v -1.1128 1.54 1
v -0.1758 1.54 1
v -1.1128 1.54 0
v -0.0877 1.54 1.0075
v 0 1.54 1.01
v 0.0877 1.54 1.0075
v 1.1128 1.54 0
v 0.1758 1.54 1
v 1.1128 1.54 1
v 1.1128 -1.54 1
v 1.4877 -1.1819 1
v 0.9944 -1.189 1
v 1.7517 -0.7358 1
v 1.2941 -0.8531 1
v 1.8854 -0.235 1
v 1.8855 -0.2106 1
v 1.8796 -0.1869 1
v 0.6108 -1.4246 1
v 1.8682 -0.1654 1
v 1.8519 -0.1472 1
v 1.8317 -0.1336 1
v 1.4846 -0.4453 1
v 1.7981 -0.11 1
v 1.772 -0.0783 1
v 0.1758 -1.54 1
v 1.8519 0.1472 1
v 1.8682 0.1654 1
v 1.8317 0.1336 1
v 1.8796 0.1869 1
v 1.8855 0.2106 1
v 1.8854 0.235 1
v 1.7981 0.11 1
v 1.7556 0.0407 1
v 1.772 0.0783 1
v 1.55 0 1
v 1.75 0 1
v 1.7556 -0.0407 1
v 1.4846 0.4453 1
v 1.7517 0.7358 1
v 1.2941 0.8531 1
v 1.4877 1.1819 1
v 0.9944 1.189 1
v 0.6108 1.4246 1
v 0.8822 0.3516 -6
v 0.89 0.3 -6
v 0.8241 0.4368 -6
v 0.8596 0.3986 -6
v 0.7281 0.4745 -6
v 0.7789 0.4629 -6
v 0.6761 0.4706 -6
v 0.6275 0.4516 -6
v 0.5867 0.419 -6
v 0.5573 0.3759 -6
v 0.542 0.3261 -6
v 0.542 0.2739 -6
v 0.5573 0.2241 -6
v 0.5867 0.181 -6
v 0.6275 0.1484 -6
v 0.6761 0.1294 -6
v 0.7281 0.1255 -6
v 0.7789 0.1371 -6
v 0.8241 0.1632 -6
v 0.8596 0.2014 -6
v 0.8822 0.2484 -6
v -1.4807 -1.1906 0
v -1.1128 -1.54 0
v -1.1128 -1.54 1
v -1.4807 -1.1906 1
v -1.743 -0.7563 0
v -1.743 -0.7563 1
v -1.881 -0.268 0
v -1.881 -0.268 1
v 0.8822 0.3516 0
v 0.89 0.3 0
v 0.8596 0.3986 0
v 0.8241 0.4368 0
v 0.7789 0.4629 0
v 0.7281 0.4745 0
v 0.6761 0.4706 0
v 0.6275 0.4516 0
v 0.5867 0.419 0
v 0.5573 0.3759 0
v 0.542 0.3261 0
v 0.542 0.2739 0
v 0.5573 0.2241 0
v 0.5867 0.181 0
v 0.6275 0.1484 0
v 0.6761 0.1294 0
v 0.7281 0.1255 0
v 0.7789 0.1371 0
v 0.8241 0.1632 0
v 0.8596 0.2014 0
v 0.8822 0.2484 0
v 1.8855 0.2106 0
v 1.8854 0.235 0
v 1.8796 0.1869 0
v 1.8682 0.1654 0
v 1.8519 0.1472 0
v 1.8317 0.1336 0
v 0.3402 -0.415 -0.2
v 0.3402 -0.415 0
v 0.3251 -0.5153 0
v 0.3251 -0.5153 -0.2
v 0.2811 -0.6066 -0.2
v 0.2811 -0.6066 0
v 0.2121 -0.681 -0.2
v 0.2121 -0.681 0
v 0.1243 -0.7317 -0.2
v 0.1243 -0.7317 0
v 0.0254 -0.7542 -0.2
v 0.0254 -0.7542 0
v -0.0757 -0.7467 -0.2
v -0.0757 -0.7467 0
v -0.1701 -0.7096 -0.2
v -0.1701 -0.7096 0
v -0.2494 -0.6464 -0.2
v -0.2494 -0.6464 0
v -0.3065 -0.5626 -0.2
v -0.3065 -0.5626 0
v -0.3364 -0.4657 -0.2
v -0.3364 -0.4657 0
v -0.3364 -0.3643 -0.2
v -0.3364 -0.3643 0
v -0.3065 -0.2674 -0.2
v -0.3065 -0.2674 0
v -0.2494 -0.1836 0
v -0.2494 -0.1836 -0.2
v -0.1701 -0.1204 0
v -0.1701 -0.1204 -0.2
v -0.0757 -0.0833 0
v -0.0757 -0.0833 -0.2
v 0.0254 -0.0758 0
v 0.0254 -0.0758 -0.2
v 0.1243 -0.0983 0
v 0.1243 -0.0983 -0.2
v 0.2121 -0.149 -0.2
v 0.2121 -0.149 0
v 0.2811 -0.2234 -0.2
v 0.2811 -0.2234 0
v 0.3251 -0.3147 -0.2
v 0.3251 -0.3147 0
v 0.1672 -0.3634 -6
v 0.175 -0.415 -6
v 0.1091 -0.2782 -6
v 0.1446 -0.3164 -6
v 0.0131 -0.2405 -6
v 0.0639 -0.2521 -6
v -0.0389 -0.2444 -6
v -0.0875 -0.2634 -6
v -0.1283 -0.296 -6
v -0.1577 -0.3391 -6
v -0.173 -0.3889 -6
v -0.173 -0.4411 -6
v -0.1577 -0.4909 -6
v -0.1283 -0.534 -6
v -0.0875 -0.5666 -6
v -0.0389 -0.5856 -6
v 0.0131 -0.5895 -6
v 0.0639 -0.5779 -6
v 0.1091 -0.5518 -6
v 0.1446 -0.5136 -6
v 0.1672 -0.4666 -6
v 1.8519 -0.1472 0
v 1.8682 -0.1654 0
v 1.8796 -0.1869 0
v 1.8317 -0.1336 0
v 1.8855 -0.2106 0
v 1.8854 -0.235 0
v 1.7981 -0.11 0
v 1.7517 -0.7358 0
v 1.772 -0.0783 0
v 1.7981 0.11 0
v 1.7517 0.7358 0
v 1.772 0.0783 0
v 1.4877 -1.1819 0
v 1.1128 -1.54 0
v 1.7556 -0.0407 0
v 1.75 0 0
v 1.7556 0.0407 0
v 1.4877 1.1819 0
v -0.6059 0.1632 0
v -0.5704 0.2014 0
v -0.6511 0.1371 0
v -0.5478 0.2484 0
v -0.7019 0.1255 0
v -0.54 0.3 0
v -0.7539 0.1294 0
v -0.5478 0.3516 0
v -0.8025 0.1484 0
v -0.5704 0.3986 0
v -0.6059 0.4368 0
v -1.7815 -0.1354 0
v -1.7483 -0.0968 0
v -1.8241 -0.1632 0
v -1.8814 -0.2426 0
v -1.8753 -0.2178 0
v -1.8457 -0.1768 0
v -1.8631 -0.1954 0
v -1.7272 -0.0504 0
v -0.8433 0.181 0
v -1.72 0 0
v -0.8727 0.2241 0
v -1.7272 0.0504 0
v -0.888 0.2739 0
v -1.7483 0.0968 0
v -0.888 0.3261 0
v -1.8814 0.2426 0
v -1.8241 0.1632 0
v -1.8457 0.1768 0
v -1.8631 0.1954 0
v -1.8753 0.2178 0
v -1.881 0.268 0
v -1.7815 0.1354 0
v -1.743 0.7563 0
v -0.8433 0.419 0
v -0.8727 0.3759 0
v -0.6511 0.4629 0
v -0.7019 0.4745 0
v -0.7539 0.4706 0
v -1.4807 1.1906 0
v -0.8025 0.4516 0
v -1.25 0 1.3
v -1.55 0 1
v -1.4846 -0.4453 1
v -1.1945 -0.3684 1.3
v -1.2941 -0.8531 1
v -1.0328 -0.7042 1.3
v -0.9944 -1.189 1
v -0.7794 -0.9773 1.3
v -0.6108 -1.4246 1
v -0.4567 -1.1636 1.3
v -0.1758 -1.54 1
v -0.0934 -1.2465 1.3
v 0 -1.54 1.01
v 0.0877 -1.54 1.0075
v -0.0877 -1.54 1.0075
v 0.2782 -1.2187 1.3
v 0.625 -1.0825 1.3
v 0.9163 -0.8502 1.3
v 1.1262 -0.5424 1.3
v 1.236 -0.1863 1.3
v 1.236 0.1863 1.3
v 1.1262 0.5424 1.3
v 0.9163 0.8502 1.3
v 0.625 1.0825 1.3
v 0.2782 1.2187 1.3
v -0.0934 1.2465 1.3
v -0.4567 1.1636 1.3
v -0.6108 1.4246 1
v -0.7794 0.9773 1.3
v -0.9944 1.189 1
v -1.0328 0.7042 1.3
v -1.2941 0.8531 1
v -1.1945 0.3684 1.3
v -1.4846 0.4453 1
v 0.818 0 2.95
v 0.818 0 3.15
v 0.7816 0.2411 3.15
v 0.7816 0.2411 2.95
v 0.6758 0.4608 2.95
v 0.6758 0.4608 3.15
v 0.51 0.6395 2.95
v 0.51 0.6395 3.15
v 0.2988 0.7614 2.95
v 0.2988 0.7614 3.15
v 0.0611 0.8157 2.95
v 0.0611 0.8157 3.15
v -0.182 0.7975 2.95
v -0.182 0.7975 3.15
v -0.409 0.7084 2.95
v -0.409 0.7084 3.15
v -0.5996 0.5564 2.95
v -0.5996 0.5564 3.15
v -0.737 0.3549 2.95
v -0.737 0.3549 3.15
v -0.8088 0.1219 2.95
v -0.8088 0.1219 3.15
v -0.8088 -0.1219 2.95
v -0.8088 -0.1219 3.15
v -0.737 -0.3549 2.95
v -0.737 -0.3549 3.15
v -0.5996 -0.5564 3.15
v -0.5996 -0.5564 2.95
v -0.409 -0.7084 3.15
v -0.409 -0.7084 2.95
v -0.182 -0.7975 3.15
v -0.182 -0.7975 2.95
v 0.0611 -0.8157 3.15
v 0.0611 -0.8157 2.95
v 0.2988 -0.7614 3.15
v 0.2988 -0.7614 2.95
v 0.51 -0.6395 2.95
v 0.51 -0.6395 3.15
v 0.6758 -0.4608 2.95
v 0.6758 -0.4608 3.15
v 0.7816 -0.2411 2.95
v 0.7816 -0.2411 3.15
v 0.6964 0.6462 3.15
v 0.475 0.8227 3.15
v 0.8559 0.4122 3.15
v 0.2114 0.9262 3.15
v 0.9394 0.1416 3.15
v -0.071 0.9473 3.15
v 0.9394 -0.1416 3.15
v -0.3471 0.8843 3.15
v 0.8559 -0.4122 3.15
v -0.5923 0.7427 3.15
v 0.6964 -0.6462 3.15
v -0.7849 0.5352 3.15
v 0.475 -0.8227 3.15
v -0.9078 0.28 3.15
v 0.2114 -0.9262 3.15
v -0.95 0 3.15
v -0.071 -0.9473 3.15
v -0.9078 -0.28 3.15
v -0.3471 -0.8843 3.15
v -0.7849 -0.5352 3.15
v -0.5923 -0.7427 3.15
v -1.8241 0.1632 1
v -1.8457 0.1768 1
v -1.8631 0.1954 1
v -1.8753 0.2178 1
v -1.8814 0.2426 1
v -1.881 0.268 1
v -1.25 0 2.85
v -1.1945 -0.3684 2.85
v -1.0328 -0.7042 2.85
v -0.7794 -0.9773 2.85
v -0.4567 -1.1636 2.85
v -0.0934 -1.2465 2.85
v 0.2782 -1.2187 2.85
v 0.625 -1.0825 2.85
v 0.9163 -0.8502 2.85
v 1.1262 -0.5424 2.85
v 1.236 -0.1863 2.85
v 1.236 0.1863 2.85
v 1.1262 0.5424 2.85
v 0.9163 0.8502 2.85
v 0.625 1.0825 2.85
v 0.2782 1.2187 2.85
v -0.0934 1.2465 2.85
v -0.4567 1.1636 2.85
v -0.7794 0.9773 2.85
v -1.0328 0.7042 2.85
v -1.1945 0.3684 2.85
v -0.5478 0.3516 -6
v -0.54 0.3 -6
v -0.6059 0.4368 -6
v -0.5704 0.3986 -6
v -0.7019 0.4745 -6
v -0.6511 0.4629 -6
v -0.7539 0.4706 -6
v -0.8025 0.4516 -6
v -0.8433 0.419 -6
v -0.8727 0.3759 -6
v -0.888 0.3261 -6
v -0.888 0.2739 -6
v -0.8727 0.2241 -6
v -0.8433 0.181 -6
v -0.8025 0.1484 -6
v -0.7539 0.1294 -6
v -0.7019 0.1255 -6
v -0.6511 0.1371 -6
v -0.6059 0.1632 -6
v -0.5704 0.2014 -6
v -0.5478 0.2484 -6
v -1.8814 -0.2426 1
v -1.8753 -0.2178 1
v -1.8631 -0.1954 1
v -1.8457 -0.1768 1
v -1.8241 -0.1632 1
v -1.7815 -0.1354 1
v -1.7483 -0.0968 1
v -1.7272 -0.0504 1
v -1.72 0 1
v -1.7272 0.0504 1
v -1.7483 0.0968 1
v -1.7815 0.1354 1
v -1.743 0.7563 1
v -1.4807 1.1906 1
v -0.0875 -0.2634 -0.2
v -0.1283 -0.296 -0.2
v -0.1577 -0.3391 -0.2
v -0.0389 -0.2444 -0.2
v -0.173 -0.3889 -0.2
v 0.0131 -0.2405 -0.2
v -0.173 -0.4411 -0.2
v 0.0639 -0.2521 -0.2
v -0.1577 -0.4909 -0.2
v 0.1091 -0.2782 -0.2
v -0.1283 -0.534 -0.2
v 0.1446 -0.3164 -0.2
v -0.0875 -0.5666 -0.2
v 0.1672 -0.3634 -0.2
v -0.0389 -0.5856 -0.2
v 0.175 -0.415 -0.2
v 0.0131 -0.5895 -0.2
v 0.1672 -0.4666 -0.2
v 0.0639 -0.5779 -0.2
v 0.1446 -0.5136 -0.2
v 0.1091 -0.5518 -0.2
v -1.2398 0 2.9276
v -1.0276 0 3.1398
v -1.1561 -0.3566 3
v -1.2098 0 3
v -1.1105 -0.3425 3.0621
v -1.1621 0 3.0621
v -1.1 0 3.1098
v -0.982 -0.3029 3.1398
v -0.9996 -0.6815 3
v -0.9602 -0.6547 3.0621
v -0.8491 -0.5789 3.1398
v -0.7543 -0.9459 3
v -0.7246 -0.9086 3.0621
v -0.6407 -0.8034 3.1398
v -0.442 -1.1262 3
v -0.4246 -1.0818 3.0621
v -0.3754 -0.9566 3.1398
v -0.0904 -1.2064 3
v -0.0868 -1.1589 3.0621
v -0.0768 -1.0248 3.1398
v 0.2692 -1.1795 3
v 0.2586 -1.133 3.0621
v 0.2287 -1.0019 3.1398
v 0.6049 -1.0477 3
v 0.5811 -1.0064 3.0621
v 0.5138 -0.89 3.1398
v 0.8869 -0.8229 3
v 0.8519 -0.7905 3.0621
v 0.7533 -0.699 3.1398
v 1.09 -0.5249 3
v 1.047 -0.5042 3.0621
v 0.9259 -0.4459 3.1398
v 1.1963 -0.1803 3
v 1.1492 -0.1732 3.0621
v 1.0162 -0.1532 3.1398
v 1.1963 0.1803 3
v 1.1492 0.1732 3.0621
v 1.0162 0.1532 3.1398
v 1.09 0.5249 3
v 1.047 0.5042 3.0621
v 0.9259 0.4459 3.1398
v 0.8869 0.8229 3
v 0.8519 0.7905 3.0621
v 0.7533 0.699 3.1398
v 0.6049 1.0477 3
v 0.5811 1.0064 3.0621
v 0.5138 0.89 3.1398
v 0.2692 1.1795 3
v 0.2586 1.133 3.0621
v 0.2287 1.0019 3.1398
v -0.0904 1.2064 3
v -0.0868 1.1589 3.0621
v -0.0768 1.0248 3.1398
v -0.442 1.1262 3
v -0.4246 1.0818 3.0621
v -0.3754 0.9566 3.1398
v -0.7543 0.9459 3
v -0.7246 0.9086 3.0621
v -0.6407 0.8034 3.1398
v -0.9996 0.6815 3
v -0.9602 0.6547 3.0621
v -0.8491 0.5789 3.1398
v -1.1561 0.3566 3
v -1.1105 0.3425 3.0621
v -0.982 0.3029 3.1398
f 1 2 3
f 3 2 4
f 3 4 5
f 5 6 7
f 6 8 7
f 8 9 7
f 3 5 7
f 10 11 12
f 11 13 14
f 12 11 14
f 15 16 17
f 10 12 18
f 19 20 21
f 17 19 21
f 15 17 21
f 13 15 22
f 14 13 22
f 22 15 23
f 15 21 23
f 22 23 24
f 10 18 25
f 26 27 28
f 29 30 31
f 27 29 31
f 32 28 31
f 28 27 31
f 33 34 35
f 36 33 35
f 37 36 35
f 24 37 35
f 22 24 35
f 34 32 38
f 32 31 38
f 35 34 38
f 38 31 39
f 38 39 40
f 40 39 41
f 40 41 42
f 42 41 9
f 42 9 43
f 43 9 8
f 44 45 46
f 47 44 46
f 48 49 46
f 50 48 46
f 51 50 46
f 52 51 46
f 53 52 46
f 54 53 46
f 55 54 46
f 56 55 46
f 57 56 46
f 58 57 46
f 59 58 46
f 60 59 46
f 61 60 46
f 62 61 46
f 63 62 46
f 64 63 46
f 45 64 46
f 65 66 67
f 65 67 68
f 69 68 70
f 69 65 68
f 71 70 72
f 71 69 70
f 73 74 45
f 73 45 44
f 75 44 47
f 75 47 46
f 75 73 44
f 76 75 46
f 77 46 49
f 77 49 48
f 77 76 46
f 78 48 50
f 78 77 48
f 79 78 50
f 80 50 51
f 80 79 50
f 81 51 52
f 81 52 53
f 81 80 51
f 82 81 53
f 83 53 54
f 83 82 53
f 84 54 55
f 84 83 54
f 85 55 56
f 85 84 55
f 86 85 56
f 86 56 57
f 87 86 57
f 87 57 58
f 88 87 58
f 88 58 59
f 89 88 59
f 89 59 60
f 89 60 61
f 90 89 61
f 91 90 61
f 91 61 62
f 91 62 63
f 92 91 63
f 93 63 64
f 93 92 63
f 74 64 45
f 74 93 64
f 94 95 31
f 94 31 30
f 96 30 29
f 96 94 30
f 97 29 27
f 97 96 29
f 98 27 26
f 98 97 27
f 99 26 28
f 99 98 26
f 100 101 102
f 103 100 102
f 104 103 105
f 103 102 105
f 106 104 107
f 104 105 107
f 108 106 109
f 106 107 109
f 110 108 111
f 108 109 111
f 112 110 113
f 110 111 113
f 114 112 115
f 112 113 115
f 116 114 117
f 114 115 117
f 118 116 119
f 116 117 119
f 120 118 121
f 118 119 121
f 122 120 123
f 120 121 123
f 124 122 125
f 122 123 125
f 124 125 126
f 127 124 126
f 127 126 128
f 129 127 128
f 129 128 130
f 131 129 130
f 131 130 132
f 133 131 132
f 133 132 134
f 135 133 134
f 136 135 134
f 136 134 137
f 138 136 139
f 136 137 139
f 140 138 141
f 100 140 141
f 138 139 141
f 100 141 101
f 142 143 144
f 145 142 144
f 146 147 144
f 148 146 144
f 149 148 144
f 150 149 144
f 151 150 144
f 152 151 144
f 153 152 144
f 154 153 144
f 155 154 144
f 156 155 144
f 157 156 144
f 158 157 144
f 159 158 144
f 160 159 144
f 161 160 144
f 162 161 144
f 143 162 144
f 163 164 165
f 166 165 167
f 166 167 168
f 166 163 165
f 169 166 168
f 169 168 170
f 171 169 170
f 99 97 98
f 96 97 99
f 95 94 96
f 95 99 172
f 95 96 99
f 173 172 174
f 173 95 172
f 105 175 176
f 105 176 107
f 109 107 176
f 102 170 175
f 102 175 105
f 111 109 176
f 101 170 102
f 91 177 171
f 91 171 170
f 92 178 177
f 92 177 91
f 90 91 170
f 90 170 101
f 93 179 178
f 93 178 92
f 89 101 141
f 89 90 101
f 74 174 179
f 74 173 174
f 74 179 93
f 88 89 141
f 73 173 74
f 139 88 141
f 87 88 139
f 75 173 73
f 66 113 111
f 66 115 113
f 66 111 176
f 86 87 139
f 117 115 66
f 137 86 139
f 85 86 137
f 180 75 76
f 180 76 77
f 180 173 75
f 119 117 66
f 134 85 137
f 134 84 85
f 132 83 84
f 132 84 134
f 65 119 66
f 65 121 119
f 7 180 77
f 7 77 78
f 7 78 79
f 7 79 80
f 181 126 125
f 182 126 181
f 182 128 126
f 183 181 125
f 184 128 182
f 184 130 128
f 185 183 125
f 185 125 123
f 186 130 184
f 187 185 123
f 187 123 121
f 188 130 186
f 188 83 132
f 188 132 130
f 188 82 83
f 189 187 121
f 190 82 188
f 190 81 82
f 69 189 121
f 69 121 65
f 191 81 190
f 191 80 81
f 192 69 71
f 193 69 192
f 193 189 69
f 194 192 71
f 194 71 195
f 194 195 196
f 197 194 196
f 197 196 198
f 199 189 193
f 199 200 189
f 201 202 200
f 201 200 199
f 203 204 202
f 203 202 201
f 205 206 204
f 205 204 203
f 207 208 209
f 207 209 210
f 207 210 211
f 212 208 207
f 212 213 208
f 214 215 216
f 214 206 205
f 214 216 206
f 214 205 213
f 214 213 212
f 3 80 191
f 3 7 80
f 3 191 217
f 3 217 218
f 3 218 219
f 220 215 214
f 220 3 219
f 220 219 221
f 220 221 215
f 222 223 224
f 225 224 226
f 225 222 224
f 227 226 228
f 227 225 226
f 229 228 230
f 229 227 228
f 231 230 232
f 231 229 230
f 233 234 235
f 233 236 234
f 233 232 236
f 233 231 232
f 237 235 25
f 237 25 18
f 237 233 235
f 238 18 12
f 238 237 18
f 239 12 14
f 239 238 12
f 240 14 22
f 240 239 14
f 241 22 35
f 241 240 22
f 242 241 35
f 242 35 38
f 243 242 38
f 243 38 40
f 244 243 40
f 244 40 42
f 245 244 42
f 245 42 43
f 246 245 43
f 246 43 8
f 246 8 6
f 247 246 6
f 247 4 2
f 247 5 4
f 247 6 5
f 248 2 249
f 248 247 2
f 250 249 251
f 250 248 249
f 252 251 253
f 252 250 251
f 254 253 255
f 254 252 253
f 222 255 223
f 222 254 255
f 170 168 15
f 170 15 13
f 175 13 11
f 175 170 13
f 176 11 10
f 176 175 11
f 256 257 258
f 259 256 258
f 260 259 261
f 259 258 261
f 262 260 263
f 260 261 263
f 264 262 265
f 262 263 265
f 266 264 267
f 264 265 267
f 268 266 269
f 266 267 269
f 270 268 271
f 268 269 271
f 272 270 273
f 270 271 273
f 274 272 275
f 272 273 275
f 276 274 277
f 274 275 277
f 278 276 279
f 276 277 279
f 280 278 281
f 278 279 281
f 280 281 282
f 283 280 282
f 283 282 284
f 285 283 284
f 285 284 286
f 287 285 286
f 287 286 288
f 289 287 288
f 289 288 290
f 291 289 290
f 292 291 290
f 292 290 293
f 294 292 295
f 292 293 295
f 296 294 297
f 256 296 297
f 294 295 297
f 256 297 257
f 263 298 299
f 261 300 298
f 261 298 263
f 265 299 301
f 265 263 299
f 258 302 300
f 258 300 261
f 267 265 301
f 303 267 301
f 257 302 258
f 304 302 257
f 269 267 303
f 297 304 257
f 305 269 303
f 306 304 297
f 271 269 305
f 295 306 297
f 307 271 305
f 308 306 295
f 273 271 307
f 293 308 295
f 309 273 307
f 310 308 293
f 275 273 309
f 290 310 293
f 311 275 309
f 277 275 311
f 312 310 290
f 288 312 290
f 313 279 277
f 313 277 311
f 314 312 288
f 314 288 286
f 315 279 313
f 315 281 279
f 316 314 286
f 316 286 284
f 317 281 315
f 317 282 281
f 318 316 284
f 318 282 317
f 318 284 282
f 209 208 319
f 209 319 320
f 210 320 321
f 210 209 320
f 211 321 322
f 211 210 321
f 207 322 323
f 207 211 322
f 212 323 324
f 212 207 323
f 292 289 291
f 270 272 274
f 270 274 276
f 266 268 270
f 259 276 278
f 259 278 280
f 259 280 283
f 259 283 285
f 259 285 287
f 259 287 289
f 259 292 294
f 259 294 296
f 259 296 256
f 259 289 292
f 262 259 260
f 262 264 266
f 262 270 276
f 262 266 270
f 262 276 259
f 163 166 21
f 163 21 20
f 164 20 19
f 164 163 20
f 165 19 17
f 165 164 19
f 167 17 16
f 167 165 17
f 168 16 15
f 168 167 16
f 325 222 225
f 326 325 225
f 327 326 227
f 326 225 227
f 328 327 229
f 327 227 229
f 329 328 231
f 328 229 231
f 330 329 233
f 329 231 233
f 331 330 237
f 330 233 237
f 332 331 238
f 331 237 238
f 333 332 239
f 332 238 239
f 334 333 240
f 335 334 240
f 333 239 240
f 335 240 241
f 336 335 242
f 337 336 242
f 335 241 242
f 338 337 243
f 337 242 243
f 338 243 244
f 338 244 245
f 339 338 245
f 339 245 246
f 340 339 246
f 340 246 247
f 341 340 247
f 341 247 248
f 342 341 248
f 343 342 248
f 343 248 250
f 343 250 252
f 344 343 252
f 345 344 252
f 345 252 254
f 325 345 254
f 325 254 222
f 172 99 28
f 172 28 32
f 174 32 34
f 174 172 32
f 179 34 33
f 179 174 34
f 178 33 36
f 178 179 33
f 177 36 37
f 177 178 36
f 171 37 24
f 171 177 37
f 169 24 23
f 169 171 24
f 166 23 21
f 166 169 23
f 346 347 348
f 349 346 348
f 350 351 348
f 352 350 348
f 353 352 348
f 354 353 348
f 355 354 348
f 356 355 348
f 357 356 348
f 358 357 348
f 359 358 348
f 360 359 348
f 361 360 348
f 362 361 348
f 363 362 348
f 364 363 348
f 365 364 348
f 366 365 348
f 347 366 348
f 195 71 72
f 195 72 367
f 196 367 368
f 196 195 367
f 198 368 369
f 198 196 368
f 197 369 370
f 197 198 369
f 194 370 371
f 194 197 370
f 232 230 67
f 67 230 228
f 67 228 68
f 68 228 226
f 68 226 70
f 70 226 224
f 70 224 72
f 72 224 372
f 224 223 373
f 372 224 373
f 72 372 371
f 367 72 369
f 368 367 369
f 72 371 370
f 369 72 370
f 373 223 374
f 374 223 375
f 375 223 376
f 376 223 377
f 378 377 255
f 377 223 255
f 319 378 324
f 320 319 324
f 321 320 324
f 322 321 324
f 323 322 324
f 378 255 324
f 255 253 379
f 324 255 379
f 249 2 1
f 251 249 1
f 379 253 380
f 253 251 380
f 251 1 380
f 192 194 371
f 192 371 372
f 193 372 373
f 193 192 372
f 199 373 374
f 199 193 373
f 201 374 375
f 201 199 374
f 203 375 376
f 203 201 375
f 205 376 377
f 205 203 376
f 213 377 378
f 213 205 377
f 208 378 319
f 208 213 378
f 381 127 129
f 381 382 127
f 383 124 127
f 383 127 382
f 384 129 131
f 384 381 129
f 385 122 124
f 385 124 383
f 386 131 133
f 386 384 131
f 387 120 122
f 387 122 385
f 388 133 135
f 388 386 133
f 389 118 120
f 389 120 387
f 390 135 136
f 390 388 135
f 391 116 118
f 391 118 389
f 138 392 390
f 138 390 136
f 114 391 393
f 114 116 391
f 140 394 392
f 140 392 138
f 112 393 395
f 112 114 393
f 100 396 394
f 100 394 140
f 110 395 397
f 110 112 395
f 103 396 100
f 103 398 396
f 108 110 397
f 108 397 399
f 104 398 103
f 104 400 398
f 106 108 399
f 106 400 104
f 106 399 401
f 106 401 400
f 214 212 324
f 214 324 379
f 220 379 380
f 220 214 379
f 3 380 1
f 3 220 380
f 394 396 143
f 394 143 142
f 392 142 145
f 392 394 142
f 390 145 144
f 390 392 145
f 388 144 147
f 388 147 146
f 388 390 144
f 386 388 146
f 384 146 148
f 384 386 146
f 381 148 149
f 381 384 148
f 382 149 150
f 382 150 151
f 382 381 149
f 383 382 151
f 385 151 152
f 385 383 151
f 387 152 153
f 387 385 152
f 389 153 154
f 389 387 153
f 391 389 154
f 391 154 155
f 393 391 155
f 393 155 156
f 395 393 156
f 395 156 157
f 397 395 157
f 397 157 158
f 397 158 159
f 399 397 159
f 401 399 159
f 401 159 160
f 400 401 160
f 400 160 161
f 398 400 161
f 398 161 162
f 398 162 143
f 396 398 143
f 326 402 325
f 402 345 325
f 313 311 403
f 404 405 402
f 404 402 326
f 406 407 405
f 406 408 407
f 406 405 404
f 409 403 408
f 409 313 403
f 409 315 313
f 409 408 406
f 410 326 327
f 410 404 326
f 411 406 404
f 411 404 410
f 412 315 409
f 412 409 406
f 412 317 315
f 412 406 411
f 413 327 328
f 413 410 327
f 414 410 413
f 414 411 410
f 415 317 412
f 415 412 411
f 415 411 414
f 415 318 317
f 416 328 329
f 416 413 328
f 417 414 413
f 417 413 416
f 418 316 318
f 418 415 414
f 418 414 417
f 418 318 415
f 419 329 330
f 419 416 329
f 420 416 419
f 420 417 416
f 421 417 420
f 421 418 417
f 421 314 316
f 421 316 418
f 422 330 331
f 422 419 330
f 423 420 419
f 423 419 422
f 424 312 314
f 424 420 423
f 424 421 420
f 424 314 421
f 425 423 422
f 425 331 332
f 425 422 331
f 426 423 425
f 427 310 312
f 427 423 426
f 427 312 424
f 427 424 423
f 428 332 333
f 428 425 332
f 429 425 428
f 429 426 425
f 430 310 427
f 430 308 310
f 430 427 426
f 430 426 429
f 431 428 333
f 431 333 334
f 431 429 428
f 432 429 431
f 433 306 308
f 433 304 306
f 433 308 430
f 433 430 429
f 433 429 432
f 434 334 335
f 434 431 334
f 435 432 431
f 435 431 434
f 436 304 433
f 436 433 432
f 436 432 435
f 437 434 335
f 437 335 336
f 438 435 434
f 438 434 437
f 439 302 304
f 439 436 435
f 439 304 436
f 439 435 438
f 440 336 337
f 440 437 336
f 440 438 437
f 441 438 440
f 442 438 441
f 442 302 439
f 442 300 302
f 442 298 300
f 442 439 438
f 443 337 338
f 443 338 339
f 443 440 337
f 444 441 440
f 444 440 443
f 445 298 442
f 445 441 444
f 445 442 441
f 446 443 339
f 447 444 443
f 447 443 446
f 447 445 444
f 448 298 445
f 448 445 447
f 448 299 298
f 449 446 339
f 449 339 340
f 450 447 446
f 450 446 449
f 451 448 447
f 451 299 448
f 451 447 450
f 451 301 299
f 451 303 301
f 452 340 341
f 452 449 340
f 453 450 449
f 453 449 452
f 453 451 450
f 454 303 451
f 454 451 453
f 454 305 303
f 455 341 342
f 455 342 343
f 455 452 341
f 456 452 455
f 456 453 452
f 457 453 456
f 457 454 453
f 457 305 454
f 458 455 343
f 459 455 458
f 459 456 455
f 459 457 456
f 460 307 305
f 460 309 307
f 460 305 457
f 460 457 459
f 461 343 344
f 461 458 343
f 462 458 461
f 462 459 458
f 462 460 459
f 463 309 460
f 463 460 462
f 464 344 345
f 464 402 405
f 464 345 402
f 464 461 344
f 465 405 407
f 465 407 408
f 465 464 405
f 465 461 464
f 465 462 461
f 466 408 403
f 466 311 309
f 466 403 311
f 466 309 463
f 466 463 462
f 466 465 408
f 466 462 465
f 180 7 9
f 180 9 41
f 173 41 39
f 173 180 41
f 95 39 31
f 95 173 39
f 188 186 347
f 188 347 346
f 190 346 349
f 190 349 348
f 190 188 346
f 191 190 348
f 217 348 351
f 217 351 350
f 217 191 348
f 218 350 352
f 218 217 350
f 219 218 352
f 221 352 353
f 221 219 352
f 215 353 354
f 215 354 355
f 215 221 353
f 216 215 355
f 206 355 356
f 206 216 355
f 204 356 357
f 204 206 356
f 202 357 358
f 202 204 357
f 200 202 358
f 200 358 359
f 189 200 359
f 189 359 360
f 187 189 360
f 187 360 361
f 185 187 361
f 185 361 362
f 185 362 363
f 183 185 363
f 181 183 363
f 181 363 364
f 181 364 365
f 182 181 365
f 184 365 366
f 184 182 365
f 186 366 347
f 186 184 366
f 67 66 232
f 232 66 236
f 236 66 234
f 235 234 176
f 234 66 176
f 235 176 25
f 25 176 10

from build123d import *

# Parameters (mm, degrees)
BOSS_EXTRUDE1_DEPTH = 1
SKETCH3_R           = 1.25
BOSS_EXTRUDE2_DEPTH = 2.15
CHAMFER1_SIZE       = 0.3
FILLET1_R           = 0.3
SKETCH4_R           = 0.817963918
CUT_EXTRUDE1_DEPTH  = 0.2
SKETCH5_R           = 0.175
BOSS_EXTRUDE3_DEPTH = 6
SKETCH6_R           = 0.340201154
BOSS_EXTRUDE4_DEPTH = 0.2


with BuildPart() as part:
    # Sketch1 → Boss-Extrude1 (new body)
    with BuildSketch(Plane.XY):
        with BuildLine():
            Line((-1.112834219, 1.54), (1.112834219, 1.54))
            ThreePointArc((1.112834219, 1.54), (1.63498089, 0.967903657), (1.885416667, 0.2349553))
            ThreePointArc((1.885416667, 0.2349553), (1.874554764, 0.175784903), (1.831710526, 0.133553539))
            ThreePointArc((1.831710526, 0.133553539), (1.75, 0), (1.831710526, -0.133553539))
            ThreePointArc((1.831710526, -0.133553539), (1.874554764, -0.175784903), (1.885416667, -0.2349553))
            ThreePointArc((1.885416667, -0.2349553), (1.63498089, -0.967903657), (1.112834219, -1.54))
            Line((1.112834219, -1.54), (-1.112834219, -1.54))
            ThreePointArc((-1.112834219, -1.54), (-1.626419084, -0.982222462), (-1.881, -0.268027984))
            ThreePointArc((-1.881, -0.268027984), (-1.869896042, -0.206231776), (-1.824142857, -0.163235088))
            ThreePointArc((-1.824142857, -0.163235088), (-1.72, 0), (-1.824142857, 0.163235088))
            ThreePointArc((-1.824142857, 0.163235088), (-1.869896042, 0.206231776), (-1.881, 0.268027984))
            ThreePointArc((-1.881, 0.268027984), (-1.626419084, 0.982222462), (-1.112834219, 1.54))
        make_face()
    extrude(amount=BOSS_EXTRUDE1_DEPTH)

    # Sketch3 → Boss-Extrude2 (add)
    with BuildSketch(Plane.XY.offset(1)):
        with Locations(Location((0, 0, 0), (0, 0, 180))):
            Circle(SKETCH3_R)
    extrude(amount=BOSS_EXTRUDE2_DEPTH)

    # Chamfer1
    # the kernel refuses this chamfer: 0.3 mm, written as the material it adds along each edge
    with BuildSketch(Plane(origin=(0, 0, 1), x_dir=(-1, 0, 0), z_dir=(0, 1, 0))) as chamfer1_piece_1_section:
        Polygon((1.25 + CHAMFER1_SIZE, 0), (1.25, CHAMFER1_SIZE), (1.25, 0), align=None)
    chamfer1_piece_1 = revolve(axis=Axis((0, 0, 1), (0, 0, 1)), mode=Mode.PRIVATE)
    chamfer1_piece_1 = split(chamfer1_piece_1, bisect_by=Plane(origin=(1.394706395, -1.54, 1.144706395), z_dir=(0, 1, 0)), keep=Keep.TOP, mode=Mode.PRIVATE)
    chamfer1_piece_1 = split(chamfer1_piece_1, bisect_by=Plane(origin=(1.394706395, 1.54, 1.144706395), z_dir=(0, -1, 0)), keep=Keep.TOP, mode=Mode.PRIVATE)
    add(chamfer1_piece_1)

    # Fillet1
    fillet1_edges = [part.edges().sort_by_distance(p)[0] for p in [
        (1.25, 0, 3.15),
    ]]
    fillet(fillet1_edges, radius=FILLET1_R)

    # Sketch4 → Cut-Extrude1 (cut)
    with BuildSketch(Plane.XY.offset(3.15)):
        Circle(SKETCH4_R)
    extrude(amount=-CUT_EXTRUDE1_DEPTH, mode=Mode.SUBTRACT)

    # Sketch5 → Boss-Extrude3 (add)
    with BuildSketch(Plane.XY):
        with Locations((0.715, 0.3)):
            Circle(SKETCH5_R)
        with Locations((-0.715, 0.3)):
            Circle(SKETCH5_R)
        with Locations((0, -0.415)):
            Circle(SKETCH5_R)
    extrude(amount=-BOSS_EXTRUDE3_DEPTH)

    # Sketch6 → Boss-Extrude4 (add)
    with BuildSketch(Plane(origin=(0, 0, 0), x_dir=(-1, 0, 0), z_dir=(0, 0, -1))):
        with Locations(Location((0, -0.415, 0), (0, 0, 180))):
            Circle(SKETCH6_R)
    extrude(amount=BOSS_EXTRUDE4_DEPTH)


solid = part.part
